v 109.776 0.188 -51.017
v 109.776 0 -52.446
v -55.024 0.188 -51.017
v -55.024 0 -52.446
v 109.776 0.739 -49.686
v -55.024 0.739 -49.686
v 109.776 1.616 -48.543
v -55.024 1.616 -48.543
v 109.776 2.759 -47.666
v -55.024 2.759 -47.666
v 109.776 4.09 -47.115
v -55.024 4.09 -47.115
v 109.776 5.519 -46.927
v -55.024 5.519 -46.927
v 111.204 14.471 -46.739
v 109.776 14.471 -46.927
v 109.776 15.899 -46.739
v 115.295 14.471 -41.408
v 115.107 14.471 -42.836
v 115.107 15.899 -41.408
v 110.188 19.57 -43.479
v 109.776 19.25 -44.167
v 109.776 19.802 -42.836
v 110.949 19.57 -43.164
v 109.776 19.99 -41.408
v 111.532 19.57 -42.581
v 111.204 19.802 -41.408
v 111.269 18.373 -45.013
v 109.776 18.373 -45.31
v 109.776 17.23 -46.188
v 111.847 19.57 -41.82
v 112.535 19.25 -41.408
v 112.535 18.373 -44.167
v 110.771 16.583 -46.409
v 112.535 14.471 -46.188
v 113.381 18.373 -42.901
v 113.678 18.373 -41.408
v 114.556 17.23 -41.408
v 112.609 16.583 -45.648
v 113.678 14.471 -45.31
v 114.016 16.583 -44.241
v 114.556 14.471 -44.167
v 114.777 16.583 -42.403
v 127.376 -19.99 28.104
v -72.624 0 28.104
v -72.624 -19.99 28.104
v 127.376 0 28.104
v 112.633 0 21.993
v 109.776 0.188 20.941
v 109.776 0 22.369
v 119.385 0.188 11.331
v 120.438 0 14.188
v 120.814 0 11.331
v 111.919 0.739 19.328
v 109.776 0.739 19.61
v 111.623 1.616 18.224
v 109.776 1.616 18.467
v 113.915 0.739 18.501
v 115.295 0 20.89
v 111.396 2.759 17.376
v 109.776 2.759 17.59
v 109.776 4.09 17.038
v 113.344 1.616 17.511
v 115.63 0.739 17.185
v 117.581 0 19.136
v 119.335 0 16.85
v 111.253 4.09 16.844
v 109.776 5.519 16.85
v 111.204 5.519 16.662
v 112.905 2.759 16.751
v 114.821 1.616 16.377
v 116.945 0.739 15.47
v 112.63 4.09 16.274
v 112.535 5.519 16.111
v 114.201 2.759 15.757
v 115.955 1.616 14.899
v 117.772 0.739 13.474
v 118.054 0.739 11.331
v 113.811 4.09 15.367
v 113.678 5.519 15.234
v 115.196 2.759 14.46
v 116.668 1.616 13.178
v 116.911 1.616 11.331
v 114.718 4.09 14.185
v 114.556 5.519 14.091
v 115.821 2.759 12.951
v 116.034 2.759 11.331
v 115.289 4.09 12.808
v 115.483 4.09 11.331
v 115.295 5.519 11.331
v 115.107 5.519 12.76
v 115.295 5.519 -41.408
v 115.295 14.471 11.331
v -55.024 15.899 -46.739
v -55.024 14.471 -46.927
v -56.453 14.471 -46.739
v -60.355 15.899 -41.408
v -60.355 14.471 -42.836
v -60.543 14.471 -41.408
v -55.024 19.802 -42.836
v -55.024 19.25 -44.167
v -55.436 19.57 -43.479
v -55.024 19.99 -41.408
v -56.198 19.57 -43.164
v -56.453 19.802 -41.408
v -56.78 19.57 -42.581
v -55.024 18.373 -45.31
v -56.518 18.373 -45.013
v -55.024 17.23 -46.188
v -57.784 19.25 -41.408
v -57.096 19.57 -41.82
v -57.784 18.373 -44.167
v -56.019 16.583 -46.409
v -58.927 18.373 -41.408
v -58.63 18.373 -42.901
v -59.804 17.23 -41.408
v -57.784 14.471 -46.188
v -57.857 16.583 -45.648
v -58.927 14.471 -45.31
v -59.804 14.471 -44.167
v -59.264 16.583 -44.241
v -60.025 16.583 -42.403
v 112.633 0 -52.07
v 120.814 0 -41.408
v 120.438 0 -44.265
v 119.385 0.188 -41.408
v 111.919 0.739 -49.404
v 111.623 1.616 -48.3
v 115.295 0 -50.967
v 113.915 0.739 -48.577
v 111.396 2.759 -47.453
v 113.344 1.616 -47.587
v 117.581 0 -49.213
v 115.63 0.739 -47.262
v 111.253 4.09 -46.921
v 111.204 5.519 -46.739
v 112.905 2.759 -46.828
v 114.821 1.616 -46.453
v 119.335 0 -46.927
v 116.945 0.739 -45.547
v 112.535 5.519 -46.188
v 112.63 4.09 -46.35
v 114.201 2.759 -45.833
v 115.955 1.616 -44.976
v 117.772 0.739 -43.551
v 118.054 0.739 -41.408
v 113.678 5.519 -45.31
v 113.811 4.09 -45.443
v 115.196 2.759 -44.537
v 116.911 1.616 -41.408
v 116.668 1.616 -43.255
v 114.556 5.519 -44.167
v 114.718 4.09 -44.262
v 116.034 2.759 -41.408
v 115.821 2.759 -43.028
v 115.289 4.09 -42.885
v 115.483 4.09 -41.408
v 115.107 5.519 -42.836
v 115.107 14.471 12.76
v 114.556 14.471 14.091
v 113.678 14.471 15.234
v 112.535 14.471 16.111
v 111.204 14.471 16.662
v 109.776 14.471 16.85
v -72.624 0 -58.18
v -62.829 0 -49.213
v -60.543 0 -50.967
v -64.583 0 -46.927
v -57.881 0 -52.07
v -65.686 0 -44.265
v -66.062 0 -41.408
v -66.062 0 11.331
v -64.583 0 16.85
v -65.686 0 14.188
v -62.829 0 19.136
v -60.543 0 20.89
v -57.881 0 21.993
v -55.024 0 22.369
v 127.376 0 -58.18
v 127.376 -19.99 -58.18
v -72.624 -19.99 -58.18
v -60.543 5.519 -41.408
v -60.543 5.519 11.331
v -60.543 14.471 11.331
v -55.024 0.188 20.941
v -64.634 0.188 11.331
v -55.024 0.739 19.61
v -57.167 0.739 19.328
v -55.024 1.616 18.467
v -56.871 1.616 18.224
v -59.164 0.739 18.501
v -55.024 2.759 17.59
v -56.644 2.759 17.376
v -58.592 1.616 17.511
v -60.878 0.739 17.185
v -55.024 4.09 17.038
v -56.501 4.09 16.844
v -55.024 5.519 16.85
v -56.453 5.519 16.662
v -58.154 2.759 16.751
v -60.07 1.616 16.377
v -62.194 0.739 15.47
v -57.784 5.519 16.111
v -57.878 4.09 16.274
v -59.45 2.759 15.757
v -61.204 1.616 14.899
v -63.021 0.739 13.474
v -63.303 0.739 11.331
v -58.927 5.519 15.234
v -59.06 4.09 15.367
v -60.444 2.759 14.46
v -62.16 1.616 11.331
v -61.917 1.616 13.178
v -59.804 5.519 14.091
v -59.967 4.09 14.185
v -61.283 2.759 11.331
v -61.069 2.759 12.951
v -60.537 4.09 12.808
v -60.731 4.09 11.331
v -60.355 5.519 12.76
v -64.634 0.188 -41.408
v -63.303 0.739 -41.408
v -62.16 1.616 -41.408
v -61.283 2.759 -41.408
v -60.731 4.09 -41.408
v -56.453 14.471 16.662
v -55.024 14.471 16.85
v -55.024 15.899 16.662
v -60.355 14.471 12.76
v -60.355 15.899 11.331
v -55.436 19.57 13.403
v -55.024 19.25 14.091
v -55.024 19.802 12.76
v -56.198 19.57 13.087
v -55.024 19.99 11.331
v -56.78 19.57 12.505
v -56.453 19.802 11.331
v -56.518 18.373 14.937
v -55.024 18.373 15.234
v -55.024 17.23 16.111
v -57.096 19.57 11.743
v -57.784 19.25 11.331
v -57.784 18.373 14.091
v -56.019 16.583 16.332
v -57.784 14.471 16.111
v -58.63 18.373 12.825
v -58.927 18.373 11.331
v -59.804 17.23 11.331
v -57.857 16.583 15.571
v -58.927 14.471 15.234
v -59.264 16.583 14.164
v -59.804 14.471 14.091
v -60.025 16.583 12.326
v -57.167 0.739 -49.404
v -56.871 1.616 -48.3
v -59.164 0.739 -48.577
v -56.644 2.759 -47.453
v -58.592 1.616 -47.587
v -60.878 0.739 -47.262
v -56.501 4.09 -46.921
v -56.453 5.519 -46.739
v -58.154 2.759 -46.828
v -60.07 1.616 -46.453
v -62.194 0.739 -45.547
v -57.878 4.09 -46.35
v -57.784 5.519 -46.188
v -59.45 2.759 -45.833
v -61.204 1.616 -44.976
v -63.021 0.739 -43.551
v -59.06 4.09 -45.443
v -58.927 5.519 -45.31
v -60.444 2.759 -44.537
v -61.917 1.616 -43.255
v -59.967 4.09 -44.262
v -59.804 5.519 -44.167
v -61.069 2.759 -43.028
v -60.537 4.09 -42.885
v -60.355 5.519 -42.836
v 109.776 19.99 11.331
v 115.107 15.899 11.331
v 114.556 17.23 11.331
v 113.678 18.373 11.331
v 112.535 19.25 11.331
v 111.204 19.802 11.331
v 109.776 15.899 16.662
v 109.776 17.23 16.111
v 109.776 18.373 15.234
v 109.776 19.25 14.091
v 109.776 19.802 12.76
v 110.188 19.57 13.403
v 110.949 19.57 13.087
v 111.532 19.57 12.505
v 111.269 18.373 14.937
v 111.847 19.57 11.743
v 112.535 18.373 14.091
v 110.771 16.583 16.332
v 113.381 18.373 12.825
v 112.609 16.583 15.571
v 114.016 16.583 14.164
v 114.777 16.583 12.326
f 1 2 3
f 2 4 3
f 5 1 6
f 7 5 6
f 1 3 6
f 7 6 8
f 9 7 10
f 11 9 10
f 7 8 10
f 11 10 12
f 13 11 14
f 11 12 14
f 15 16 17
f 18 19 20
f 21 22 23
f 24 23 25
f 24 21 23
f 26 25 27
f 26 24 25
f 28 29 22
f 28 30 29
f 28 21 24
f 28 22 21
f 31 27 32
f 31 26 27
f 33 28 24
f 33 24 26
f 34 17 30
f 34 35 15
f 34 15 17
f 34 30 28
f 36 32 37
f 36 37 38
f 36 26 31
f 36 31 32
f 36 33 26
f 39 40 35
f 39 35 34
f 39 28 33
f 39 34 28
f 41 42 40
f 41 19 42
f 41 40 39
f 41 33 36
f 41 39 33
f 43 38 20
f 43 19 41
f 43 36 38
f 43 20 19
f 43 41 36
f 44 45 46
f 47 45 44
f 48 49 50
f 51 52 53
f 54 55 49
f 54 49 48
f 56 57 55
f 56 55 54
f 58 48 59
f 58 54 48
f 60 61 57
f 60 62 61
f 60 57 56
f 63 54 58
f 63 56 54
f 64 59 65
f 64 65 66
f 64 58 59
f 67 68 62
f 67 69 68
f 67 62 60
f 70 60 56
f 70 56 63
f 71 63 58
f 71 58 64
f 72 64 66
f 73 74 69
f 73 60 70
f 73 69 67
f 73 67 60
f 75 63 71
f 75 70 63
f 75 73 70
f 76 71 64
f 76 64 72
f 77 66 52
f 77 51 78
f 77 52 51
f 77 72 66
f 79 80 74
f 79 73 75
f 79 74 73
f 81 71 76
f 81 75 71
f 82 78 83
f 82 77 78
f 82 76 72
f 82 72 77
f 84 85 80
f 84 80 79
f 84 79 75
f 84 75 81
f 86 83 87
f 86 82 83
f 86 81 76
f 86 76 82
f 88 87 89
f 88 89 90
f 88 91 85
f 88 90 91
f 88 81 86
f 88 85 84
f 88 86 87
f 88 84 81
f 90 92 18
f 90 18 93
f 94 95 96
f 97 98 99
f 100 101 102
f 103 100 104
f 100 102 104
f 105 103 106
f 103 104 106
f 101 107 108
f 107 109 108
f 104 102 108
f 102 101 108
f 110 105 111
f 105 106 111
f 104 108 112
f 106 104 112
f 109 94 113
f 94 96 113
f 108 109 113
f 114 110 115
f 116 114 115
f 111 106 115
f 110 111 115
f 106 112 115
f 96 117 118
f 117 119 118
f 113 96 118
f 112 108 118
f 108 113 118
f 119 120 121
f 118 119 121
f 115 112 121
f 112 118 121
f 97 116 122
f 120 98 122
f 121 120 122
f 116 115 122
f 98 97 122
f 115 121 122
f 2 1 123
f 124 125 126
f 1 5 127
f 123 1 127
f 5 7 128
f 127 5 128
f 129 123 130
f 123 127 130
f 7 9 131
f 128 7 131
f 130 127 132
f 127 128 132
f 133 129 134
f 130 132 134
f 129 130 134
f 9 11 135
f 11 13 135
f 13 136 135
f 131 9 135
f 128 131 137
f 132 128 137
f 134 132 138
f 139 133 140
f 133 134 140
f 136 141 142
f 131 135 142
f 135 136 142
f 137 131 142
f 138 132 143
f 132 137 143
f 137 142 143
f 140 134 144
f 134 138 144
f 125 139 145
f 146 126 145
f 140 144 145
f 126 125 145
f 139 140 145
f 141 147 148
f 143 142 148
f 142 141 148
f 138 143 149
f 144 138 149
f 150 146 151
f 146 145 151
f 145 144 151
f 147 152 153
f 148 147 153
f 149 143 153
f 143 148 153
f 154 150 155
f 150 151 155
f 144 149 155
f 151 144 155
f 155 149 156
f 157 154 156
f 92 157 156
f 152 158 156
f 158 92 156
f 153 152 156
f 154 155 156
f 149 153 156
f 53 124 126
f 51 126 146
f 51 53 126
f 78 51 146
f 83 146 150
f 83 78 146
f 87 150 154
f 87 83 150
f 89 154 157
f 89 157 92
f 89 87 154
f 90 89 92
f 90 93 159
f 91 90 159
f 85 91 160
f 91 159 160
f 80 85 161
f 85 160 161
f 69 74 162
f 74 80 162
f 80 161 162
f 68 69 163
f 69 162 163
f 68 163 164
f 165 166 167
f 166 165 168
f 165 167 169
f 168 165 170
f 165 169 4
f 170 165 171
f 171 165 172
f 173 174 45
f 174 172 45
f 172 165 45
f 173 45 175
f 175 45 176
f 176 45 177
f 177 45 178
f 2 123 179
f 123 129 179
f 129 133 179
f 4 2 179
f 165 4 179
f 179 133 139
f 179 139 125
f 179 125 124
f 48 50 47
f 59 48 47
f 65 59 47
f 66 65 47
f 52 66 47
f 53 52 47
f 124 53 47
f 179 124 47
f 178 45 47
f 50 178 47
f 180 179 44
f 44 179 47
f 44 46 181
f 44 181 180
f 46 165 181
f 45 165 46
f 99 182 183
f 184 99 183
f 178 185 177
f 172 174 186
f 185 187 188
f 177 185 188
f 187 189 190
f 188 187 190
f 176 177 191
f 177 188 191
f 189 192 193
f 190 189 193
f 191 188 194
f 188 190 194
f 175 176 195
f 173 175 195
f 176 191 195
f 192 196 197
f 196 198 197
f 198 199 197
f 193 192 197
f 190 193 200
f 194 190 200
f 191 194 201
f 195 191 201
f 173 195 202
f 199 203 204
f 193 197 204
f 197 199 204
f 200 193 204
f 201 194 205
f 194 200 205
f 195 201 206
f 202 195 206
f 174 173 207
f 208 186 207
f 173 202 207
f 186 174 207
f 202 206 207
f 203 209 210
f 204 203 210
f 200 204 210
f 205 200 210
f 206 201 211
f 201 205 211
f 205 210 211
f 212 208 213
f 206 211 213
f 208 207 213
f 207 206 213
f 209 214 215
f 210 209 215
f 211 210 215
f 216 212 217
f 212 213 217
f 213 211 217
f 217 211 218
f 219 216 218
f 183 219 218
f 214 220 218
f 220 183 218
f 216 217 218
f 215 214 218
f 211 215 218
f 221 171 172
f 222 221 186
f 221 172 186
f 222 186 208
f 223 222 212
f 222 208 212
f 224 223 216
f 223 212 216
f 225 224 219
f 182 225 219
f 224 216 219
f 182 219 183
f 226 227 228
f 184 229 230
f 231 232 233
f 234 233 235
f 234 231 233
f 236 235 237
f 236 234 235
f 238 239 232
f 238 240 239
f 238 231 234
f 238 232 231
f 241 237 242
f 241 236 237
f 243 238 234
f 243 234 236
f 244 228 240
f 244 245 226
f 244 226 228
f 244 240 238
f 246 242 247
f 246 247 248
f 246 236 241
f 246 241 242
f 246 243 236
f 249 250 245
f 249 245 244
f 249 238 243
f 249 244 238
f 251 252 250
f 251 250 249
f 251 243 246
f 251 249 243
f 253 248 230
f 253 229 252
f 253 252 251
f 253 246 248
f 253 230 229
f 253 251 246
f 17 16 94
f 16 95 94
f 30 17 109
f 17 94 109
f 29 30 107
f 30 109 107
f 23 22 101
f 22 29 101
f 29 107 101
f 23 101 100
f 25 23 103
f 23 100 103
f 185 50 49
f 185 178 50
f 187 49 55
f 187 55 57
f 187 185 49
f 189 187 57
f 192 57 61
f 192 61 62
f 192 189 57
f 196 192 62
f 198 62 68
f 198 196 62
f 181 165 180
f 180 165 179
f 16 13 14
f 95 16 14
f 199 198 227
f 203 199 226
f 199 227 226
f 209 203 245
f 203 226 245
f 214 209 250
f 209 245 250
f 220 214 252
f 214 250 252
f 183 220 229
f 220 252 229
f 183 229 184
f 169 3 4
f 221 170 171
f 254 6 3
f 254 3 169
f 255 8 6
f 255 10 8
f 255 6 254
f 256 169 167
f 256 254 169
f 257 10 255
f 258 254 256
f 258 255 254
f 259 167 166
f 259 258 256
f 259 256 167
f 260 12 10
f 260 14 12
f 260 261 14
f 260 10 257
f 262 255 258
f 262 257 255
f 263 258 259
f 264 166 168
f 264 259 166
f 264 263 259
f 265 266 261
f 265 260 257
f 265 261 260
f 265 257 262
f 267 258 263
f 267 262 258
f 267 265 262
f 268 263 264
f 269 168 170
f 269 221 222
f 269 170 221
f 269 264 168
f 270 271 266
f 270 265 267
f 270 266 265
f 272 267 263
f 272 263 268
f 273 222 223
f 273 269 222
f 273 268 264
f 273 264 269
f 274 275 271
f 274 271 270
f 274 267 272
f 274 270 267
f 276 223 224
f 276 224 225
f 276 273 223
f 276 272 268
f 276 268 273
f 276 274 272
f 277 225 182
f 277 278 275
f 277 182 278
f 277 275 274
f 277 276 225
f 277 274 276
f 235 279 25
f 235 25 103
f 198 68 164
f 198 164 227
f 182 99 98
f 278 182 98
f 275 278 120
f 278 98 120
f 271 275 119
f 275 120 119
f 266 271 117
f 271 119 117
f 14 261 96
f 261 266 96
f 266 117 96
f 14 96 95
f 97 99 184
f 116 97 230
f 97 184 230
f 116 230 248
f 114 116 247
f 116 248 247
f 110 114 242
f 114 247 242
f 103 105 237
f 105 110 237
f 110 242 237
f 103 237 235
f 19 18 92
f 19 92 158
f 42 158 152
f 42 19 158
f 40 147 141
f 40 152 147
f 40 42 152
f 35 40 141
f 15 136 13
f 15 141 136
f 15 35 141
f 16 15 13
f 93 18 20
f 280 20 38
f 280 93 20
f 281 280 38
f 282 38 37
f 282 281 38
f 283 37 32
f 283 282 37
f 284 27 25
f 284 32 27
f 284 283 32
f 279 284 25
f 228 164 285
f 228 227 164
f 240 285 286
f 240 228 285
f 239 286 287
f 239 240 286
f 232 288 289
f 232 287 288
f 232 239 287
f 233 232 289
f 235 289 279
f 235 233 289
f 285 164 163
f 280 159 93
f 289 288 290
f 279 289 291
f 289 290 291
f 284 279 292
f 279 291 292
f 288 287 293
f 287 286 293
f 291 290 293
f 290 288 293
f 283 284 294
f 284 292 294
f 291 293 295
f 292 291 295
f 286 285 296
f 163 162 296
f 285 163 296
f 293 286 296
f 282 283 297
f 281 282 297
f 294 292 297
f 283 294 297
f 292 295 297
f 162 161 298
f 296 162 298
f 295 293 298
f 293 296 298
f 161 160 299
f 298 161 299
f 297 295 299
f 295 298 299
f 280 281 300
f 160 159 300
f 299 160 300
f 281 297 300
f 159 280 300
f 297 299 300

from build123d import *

# Parameters (mm, degrees)
F0_W     = 199.9996
F0_H     = 86.2838
F1_DEPTH = 19.9898
F2_W     = 175.8382518563
F2_H     = 63.7771419656
F3_DEPTH = 19.9898
F4_R     = 5.5188922036


# Not quite as in the source:
# - the program builds the solid bodies; features that only make, move or delete a surface that nothing else refers to are left out


with BuildPart() as f1:
    # F0 (on Front) → F1 (new body)
    with BuildSketch(Plane.XZ):
        with Locations((27.3758191615, -15.038352045)):
            Rectangle(F0_W, F0_H)
    extrude(amount=F1_DEPTH)

    # F2 (on face) → F3 (join)
    with BuildSketch(Plane(origin=(0, 0, 0), x_dir=(-1, 0, 0), z_dir=(0, 1, 0))):
        with Locations((-27.3758191615, -15.038352045)):
            Rectangle(F2_W, F2_H)
    extrude(amount=F3_DEPTH)

    # F4
    f4_edges = [f1.edges().sort_by_distance(p)[0] for p in [
        (-60.543307, 9.9949, 16.850219),
        (115.294945, 9.9949, 16.850219),
        (27.375819, 0, 16.850219),
        (27.375819, 19.9898, 16.850219),
        (115.294945, 9.9949, -46.926923),
        (-60.543307, 9.9949, -46.926923),
        (27.375819, 0, -46.926923),
        (27.375819, 19.9898, -46.926923),
        (-60.543307, 0, -15.038352),
        (-60.543307, 19.9898, -15.038352),
        (115.294945, 0, -15.038352),
        (115.294945, 19.9898, -15.038352),
    ]]
    fillet(f4_edges, radius=F4_R)


solid = f1.part
